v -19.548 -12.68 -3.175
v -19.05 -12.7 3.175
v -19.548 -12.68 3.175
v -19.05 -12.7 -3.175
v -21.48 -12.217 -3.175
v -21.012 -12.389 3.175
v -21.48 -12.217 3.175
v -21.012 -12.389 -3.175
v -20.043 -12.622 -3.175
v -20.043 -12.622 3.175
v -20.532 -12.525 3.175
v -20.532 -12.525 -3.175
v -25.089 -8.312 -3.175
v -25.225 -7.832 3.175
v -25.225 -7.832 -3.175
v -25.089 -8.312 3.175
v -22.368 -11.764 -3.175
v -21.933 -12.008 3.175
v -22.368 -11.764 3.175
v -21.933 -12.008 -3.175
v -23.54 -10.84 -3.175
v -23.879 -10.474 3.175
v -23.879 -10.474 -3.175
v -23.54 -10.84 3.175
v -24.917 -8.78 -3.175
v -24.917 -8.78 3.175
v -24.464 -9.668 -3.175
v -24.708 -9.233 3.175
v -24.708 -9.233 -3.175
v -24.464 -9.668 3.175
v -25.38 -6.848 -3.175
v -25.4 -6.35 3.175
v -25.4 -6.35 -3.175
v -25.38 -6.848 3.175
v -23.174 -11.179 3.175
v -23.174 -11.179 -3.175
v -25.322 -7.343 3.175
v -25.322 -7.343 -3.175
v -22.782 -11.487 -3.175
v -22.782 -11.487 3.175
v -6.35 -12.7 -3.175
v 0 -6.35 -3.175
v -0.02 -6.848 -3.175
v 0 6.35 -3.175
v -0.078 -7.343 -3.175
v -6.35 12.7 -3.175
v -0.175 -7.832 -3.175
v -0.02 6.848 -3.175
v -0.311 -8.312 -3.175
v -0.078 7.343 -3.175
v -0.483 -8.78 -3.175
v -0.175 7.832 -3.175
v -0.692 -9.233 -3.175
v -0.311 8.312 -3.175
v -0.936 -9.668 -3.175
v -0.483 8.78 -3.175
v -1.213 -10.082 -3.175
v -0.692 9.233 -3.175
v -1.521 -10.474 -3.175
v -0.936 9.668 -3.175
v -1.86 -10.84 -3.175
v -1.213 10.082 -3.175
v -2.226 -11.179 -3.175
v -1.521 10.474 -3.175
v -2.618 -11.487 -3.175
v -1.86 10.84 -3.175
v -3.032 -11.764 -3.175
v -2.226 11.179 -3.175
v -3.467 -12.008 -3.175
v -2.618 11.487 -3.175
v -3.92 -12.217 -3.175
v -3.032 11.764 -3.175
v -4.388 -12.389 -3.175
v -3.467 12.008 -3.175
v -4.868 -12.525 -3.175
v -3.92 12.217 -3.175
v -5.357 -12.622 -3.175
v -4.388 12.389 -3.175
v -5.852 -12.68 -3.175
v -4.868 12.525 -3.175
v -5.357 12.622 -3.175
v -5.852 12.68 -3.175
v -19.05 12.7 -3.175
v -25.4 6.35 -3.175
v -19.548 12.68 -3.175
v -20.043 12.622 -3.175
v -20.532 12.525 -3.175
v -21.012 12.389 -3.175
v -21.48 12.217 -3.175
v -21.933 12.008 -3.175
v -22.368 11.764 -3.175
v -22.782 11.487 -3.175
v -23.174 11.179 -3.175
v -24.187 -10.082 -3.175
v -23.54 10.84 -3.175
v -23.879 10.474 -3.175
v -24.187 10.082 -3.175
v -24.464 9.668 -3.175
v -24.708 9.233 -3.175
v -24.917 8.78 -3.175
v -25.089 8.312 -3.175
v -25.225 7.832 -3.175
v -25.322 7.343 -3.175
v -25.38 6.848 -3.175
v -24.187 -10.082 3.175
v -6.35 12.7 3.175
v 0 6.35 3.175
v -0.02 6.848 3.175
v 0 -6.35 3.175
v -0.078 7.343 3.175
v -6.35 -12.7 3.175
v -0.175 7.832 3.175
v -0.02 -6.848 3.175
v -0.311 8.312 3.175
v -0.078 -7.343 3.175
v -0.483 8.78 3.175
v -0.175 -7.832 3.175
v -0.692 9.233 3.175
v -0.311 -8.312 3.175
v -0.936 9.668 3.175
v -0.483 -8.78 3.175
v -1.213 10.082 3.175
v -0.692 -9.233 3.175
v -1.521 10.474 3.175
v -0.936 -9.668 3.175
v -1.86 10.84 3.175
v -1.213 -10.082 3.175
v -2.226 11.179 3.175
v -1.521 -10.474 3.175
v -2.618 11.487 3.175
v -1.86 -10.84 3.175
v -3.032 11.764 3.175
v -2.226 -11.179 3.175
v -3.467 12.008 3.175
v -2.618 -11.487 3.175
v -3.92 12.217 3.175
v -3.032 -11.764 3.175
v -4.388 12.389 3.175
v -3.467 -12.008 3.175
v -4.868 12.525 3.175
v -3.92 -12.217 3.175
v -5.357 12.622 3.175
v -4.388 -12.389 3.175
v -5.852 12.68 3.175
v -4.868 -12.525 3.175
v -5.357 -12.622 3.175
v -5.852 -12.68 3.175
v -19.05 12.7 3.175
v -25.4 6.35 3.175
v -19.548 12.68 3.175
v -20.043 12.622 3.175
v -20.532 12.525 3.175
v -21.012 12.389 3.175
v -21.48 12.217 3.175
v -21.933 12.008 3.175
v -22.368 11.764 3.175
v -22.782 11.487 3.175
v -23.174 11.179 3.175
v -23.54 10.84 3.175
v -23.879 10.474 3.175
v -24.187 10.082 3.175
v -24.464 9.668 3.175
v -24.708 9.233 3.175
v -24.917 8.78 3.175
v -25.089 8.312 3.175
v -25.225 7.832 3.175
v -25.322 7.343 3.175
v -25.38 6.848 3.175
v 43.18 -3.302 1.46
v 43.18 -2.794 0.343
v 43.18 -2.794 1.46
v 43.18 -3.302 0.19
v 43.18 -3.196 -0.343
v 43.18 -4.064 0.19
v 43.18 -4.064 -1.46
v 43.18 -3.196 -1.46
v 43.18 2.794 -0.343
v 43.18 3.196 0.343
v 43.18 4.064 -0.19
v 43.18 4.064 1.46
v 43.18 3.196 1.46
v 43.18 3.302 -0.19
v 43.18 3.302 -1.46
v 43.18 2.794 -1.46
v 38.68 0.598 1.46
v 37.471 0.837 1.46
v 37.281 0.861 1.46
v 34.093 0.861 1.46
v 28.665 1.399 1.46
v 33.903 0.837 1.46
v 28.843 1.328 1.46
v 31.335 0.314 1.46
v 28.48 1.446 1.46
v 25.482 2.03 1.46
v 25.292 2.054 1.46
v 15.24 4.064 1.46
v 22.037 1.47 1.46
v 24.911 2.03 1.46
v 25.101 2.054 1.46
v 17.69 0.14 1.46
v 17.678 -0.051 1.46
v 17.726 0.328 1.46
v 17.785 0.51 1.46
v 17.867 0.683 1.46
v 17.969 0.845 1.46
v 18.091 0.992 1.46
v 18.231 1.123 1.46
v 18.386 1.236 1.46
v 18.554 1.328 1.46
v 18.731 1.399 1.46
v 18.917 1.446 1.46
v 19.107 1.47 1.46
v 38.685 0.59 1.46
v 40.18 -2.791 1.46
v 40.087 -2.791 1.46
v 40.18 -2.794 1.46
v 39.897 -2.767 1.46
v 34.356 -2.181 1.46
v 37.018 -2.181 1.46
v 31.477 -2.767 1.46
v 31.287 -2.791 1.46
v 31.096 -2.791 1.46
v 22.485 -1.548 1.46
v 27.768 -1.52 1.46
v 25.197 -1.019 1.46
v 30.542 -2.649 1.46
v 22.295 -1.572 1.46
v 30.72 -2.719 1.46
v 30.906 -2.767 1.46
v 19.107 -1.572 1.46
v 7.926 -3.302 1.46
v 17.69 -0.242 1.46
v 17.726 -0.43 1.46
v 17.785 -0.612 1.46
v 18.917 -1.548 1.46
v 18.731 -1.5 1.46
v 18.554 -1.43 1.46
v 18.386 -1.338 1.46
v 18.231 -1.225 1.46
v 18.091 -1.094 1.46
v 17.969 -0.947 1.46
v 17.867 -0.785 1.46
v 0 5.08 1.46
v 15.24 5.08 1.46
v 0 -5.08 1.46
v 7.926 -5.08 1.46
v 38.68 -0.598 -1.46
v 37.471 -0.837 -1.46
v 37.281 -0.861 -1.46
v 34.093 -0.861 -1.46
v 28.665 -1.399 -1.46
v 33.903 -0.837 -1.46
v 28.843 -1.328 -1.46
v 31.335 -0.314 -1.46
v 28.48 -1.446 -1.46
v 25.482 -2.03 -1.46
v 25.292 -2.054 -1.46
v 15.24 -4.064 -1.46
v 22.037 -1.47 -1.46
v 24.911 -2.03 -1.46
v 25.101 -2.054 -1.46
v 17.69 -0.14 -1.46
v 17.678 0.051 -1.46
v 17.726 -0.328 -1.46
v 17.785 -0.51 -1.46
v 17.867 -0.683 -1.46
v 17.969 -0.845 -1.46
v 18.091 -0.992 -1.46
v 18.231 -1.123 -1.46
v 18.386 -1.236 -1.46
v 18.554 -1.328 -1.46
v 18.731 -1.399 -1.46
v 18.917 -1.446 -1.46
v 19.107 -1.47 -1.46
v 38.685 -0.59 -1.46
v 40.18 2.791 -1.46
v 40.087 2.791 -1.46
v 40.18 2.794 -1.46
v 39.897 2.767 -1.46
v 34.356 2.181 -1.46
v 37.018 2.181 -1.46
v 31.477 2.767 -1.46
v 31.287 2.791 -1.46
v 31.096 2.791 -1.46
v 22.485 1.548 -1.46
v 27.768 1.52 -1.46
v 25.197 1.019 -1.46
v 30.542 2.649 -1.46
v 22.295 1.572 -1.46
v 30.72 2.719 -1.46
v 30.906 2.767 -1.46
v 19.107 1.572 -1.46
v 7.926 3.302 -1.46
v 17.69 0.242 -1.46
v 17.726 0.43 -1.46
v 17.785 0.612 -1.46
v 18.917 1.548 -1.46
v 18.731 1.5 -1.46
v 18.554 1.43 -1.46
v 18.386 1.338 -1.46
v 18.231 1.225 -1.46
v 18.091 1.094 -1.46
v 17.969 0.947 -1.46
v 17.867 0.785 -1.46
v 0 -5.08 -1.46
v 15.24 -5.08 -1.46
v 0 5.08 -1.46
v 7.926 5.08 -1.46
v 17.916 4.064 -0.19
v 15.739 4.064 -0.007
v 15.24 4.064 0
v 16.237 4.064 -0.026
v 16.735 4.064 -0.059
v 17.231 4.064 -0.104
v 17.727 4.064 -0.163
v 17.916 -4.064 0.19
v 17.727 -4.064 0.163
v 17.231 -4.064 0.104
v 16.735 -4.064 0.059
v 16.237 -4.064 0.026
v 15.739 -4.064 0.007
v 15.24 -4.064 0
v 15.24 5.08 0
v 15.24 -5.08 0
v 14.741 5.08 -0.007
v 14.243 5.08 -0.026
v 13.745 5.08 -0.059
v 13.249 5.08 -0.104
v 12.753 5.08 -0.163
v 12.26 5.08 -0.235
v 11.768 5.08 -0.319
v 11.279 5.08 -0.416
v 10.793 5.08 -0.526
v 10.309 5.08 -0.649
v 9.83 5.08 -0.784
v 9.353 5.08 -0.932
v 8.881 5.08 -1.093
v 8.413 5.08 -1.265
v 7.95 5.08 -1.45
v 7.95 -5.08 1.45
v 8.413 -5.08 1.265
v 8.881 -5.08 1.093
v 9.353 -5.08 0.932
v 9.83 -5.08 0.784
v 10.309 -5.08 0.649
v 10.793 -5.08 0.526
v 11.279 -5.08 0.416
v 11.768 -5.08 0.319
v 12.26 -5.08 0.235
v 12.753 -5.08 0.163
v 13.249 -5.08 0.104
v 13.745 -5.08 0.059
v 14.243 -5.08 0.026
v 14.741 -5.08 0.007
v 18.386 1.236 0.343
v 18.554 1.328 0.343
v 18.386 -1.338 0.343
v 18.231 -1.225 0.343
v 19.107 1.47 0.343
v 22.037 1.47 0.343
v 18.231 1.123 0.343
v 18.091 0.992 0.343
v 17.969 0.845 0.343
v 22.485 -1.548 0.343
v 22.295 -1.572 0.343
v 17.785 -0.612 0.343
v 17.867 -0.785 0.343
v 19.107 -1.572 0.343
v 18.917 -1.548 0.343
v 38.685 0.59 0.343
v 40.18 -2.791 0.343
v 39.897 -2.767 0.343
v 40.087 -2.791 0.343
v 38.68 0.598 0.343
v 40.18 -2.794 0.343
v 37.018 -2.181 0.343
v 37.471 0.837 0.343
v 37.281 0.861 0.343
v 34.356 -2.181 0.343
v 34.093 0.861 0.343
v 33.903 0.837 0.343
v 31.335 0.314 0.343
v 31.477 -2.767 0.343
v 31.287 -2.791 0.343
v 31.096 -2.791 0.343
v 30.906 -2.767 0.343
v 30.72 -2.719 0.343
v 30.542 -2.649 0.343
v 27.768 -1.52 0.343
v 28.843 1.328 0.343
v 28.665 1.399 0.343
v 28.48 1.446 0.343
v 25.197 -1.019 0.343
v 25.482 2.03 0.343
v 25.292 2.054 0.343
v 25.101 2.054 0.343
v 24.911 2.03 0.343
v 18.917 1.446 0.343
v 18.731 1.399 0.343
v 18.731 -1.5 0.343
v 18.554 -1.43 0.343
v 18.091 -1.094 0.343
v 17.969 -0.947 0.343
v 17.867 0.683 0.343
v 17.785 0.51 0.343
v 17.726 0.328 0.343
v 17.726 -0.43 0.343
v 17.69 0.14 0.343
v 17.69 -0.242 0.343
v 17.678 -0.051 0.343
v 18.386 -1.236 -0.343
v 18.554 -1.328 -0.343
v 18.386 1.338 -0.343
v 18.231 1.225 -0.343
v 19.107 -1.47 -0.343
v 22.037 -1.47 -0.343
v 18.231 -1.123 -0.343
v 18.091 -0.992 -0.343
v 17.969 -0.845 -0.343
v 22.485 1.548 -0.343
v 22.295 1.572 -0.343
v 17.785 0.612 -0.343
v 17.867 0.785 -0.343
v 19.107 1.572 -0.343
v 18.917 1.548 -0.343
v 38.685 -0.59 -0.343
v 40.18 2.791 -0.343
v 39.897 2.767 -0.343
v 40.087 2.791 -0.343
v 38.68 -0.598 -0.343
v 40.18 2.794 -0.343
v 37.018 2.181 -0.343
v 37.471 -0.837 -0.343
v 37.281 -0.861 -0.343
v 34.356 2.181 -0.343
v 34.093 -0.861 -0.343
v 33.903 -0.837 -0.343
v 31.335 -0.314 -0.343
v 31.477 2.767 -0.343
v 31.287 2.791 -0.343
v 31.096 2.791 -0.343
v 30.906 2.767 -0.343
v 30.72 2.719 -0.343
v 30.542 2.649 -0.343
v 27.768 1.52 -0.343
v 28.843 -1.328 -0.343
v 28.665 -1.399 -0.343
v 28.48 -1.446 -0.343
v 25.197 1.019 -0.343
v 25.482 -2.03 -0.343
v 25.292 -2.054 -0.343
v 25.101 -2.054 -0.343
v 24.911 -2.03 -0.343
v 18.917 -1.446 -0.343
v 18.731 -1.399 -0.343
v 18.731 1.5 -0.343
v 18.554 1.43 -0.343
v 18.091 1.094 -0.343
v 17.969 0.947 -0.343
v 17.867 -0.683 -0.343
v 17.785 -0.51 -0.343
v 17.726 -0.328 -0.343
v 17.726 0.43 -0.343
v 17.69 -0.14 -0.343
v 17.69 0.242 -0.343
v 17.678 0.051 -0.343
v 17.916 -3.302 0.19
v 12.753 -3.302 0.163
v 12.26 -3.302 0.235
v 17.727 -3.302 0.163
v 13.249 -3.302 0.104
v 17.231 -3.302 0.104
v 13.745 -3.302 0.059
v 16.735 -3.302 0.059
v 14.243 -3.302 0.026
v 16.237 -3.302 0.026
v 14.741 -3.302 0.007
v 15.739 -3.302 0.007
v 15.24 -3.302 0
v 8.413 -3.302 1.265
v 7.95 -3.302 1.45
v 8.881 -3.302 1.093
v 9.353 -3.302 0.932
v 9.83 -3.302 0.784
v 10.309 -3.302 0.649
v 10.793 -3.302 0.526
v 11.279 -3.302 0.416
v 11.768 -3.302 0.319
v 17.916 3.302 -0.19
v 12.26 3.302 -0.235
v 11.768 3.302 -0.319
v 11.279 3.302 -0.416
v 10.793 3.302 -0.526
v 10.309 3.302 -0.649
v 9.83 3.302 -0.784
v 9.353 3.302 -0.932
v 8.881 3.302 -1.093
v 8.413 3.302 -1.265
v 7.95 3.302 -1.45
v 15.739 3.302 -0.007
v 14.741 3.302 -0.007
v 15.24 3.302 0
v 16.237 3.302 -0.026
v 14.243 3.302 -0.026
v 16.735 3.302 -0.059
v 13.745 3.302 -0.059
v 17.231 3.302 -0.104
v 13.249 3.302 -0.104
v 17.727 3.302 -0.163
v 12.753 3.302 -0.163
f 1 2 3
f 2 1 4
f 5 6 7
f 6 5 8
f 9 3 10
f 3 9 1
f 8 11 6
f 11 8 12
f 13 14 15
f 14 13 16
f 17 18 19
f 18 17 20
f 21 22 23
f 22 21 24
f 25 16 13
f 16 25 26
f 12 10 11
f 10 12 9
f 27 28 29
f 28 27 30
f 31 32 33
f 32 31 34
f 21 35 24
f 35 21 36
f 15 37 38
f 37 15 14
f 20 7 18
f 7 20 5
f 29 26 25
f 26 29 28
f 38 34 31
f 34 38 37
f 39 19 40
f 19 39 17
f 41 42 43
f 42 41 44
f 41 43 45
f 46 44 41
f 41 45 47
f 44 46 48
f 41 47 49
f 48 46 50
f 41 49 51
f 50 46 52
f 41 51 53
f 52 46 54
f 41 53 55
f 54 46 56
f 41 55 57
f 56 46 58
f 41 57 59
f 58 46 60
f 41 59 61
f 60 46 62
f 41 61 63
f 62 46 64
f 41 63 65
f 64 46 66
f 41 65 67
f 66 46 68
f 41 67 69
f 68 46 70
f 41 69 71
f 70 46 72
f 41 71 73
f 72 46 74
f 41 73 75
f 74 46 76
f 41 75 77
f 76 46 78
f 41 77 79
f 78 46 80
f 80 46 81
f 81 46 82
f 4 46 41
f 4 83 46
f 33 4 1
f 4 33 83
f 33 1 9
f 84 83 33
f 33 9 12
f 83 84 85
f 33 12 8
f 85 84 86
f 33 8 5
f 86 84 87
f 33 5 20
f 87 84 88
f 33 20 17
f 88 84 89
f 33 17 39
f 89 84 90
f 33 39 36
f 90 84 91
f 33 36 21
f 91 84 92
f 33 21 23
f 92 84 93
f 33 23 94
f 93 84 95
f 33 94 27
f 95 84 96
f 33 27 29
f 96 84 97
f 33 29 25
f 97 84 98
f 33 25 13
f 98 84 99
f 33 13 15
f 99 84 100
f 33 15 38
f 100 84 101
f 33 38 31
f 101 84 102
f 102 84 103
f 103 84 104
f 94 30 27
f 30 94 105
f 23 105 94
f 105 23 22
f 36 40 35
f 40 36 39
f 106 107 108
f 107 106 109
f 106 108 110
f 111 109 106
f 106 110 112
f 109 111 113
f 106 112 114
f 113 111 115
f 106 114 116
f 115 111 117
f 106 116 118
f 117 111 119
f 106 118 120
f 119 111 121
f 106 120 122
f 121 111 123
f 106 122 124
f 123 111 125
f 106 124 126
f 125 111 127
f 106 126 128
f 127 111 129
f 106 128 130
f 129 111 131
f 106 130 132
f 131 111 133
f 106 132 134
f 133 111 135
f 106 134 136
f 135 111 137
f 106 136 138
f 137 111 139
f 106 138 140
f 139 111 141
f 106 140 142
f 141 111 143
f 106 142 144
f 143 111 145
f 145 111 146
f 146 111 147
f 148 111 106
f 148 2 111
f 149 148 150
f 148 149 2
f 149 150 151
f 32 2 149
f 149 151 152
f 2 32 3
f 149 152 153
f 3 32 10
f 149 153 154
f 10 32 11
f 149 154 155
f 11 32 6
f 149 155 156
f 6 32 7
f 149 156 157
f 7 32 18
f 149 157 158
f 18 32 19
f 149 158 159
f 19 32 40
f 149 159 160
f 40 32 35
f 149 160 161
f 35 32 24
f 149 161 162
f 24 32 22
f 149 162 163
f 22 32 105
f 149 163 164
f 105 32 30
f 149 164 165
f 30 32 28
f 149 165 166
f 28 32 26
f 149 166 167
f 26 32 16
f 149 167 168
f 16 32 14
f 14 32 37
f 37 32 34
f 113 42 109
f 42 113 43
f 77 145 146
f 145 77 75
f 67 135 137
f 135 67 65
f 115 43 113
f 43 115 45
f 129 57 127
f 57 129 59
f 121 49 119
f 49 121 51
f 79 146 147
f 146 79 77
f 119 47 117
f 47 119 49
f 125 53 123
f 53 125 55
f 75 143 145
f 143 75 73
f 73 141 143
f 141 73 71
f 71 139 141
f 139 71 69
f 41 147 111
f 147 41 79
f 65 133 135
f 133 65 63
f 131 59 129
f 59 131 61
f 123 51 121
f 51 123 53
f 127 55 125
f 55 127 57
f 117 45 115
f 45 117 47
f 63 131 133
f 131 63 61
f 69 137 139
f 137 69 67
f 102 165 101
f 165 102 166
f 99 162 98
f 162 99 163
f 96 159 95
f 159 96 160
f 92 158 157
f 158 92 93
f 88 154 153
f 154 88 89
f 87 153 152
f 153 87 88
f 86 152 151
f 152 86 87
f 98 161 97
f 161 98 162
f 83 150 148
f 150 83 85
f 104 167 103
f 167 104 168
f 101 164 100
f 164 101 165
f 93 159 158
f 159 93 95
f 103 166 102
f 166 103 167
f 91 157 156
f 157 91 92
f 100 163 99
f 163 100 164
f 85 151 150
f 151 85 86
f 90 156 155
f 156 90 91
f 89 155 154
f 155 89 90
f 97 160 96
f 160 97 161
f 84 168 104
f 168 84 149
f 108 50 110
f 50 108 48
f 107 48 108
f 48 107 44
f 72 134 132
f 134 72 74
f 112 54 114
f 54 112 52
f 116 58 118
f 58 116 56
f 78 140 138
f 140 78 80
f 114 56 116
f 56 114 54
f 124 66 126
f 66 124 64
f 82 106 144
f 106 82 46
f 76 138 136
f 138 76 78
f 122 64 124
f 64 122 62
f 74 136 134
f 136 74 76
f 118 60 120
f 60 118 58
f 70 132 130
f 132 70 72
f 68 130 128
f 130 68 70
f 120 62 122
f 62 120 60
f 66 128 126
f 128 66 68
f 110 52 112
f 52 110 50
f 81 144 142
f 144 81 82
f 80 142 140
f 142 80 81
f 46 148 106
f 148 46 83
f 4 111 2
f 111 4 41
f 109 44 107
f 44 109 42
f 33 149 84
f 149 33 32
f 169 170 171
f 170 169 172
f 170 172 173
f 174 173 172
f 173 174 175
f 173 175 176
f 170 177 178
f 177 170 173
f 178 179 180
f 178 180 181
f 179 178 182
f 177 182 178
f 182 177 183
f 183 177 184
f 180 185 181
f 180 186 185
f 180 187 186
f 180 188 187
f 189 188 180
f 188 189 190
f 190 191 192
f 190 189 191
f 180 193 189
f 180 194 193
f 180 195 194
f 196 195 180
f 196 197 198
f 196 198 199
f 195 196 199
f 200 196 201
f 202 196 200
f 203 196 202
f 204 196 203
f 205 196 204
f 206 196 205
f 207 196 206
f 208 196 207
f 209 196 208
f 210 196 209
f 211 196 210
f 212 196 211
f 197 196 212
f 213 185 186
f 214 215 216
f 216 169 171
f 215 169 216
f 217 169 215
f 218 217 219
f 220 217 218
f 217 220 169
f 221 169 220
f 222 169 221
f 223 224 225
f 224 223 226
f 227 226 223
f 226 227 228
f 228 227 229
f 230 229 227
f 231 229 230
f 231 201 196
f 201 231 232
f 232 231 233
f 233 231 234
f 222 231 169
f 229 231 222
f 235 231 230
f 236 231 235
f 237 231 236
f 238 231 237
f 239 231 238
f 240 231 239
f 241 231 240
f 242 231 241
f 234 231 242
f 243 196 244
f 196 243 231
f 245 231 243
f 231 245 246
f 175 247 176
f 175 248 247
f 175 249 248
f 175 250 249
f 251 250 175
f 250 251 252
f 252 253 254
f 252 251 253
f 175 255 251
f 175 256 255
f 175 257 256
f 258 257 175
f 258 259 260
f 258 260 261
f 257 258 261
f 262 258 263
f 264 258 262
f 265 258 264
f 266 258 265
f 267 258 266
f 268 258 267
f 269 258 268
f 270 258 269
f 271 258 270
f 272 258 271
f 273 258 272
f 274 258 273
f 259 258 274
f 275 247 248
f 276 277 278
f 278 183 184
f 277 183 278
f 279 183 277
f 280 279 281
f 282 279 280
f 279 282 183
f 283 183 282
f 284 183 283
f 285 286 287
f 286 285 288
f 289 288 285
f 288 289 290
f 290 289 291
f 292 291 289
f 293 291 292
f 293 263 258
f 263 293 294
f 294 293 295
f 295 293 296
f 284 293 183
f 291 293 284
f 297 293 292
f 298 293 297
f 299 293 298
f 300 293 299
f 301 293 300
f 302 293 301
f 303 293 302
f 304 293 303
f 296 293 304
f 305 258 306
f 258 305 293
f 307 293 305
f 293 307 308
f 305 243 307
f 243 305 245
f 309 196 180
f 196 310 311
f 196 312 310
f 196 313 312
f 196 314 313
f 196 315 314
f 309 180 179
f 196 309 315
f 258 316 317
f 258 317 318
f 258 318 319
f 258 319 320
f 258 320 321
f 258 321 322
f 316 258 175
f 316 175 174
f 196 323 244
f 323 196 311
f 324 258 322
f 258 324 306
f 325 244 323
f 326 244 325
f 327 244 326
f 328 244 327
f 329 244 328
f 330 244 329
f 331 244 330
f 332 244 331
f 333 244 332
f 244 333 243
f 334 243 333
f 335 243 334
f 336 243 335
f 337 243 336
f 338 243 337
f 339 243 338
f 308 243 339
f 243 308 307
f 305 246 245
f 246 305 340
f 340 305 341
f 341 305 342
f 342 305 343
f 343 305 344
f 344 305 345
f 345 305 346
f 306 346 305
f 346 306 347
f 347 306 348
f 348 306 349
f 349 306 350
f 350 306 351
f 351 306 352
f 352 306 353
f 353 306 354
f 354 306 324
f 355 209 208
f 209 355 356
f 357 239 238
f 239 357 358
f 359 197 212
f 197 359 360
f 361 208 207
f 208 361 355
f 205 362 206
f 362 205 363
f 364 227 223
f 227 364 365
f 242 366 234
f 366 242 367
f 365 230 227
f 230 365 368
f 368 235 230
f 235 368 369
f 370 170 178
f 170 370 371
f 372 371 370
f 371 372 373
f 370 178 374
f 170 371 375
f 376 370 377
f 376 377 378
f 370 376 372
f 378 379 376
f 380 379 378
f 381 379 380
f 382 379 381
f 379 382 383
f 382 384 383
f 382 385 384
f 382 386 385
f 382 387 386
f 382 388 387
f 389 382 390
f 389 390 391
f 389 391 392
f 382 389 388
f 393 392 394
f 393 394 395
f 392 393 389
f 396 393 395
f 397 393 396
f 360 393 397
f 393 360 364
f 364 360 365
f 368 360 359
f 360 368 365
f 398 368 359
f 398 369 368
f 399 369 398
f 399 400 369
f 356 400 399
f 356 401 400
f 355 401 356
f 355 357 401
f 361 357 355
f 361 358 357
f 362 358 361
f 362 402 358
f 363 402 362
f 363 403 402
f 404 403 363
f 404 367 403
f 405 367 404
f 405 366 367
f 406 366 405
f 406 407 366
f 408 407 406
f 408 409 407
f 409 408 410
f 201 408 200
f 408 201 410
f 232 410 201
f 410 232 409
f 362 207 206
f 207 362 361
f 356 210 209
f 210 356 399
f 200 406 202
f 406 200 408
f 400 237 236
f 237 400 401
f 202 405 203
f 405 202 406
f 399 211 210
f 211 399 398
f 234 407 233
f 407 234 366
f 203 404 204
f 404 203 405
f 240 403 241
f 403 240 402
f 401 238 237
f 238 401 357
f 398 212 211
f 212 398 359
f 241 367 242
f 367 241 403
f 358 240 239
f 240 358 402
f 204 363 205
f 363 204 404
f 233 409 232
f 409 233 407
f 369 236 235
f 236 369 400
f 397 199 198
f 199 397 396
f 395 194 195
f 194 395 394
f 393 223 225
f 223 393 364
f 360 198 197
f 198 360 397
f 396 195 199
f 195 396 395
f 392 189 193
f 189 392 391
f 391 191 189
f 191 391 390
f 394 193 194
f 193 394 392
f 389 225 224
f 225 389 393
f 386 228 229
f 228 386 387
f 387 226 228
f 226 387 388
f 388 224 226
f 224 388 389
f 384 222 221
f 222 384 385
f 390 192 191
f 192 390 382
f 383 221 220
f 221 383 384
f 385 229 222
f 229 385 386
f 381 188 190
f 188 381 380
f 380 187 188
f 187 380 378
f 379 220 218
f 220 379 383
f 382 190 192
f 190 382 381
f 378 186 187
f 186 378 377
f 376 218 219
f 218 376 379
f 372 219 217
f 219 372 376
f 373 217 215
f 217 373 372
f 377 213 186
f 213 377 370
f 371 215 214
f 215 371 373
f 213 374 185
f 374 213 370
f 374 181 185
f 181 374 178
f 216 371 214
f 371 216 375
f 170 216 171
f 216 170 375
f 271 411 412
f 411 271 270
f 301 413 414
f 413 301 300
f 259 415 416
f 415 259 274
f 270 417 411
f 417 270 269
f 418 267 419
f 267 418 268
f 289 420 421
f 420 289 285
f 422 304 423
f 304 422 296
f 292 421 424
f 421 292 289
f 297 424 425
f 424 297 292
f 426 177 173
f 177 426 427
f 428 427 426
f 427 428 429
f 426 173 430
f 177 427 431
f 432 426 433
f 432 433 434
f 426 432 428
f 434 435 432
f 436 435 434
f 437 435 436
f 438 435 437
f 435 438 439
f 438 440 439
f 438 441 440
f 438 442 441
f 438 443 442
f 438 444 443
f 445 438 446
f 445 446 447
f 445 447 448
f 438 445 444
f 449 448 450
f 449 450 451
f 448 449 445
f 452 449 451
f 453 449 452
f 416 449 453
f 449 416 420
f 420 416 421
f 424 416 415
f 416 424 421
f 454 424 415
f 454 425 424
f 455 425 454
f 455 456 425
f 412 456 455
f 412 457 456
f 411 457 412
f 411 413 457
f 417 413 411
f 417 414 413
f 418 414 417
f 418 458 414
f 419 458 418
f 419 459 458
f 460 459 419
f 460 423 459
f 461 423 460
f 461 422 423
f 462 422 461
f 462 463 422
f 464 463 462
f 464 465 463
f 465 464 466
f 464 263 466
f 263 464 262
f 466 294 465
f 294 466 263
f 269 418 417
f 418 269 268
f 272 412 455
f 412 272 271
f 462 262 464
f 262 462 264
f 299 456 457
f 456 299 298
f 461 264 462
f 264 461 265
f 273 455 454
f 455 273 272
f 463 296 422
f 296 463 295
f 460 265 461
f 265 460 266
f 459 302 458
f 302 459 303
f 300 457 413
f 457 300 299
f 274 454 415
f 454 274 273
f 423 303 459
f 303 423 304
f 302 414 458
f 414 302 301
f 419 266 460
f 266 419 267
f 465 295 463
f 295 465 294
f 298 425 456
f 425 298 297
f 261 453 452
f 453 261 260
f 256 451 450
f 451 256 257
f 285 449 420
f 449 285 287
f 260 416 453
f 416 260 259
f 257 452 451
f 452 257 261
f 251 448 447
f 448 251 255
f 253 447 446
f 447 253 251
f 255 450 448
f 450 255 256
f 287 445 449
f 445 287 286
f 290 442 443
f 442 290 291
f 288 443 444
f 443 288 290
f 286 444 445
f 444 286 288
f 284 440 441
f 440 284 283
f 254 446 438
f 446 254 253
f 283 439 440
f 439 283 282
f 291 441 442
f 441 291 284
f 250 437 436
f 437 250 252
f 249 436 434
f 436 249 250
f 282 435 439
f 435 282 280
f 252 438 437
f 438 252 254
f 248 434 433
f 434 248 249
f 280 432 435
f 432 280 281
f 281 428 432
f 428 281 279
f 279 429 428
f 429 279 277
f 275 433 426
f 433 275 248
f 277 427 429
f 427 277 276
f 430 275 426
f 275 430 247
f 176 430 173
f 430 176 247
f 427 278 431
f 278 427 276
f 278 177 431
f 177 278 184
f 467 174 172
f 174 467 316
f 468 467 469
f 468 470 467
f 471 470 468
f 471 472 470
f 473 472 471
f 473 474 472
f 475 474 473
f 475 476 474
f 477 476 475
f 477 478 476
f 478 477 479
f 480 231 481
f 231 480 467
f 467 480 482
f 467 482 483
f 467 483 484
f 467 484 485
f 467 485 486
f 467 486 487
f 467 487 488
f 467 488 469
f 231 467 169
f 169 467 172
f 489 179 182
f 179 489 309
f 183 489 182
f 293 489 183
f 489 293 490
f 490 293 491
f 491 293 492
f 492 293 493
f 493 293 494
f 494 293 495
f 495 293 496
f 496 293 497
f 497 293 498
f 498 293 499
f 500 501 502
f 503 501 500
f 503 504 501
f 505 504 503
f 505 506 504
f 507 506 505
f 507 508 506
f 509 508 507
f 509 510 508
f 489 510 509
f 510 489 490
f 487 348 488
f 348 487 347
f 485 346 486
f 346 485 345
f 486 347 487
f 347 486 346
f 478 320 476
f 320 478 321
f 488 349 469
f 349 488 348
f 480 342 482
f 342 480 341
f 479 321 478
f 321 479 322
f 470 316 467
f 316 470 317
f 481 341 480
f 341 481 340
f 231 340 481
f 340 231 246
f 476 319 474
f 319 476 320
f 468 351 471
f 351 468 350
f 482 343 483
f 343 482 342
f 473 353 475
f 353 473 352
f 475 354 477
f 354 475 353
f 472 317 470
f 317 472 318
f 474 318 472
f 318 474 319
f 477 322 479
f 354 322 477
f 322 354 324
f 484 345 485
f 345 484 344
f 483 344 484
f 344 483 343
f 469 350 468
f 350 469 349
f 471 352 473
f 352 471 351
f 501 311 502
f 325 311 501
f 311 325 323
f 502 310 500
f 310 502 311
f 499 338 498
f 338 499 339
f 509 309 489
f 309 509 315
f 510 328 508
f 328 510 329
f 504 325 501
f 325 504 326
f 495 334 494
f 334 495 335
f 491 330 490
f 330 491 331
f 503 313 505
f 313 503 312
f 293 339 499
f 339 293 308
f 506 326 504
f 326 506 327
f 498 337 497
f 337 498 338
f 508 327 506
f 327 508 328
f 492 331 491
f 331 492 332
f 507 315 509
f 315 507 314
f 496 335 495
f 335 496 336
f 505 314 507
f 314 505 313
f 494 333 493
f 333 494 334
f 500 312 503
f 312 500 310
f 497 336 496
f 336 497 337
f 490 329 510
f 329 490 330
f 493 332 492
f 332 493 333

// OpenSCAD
///////////////////
///  PARAMETERS ///
///////////////////


key_code = [3,3,4,3,1,2,2,1]; // this is the key code


///////////////////////////////////////////////////////////


MM_PER_IN = 25.4;

$fa=0.5; // default minimum facet angle is now 0.5
$fs=0.5; // default minimum facet size is now 0.5 mm

// All units in inches then converted to mm

// Key Head
key_head_width                = 1       * MM_PER_IN;
key_head_length               = 1       * MM_PER_IN;
key_head_height               = 0.25    * MM_PER_IN;
key_head_radius               = 0.25    * MM_PER_IN;

// Key Blade
blade_height                  = 0.115   * MM_PER_IN;
blade_width                   = 0.320   * MM_PER_IN;
blade_length                  = 1.70    * MM_PER_IN;

// Guide Groove in Side of Key Blade
side_groove_offset_from_head  = 1.1     * MM_PER_IN;
side_groove_depth             = 0.05    * MM_PER_IN;
side_groove_width             = 0.03    * MM_PER_IN;
side_groove_taper_radius      = 0.75    * MM_PER_IN;

// Key Stop - wider area at top of key blade
key_stop_offset               = 0.04    * MM_PER_IN;
key_stop_height               = 0.250   * MM_PER_IN;

// Cuts
cut_depth                     = 0.044   * MM_PER_IN; // depth of cut
cut_r                         = 0.120/2 * MM_PER_IN; // radius of cutter
cut_spacing                   = 0.118   * MM_PER_IN; // spacing between cuts
cut_positions                 = [ 0.150 * MM_PER_IN, // 1
                                  0.126 * MM_PER_IN, // 2
                                  0.102 * MM_PER_IN, // 3
                                  0.079 * MM_PER_IN  // 4 
                                ]; // these are the cuts according to the key data sheet
cut_insets                    = [ cut_spacing * 8,
                                  cut_spacing * 7,
                                  cut_spacing * 6,
                                  cut_spacing * 5,
                                  cut_spacing * 4,
                                  cut_spacing * 3,
                                  cut_spacing * 2,
                                  cut_spacing * 1
                                ] ;



//////////////////////////
///  FUNCTIONS/MODULES ///
//////////////////////////


module rounded_cir(w,l,h,r){
  // Creates a cube with the x-y edges rounded
  // Parameters:
  // w - width of cube
  // l - length of cube
  // h - height of cube
  // r - radius of rounded edges
  translate([-w/2,0,0])
  union()
  {
    translate([(-w/2+r), (-l/2+r), 0]) cylinder(r=r,h=h, center=true);
    translate([(w/2-r), (-l/2+r), 0])  cylinder(r=r,h=h, center=true);
    translate([(-w/2+r), (l/2-r), 0])  cylinder(r=r,h=h, center=true);
    translate([(w/2-r), (l/2-r), 0])   cylinder(r=r,h=h, center=true);
    cube([w-2*r,l,h], center=true); // space left inside
    cube([w,l-2*r,h], center=true); // and in the other way
  }
}

module key_cuts(rotation){
  // Creates cuts in key blade - made to be subtracted
  // parameters - rotation coordinates
  rotate(rotation)
    union(){

      // Make all blade cuts
      for(i=[0:1:6]){
        hull(){
          c1_code = key_code[i];
          c1_pos = cut_insets[i];
          c1_depth = cut_positions[c1_code-1];

          c2_code = key_code[i+1];
          c2_pos = cut_insets[i+1];
          c2_depth = cut_positions[c2_code-1];

          translate([blade_length-c1_pos,+blade_width/2-cut_r-c1_depth, blade_height/2-cut_depth]) cylinder(r=cut_r,h=blade_height, $fn=50);
          translate([blade_length-c2_pos,+blade_width/2-cut_r-c2_depth, blade_height/2-cut_depth]) cylinder(r=cut_r,h=blade_height, $fn=50);
        }    
      }
        // Cut entry way in blade
        translate([blade_length-3,-2,blade_height/2-cut_depth]) rotate([0,0,30]) cube([10,3,10]);
        translate([blade_length-3,-cut_r*2+blade_width/2-cut_positions[0],blade_height/2-cut_depth]) rotate([0,0,0]) cube([10,cut_r*2,10]);
  }
}


///////////////////////
///  MODEL CREATION ///
///////////////////////


// Create hey head
rounded_cir(  w=key_head_width, 
              l=key_head_length, 
              h=key_head_height, 
              r=key_head_radius );


// Key Blade
side_groove_offset = blade_length-side_groove_offset_from_head; // where to start cube cut - distance from key head
difference(){
  union(){
    // create key blade base
    translate([0,-blade_width/2,-blade_height/2]) 
      cube([blade_length,blade_width,blade_height]);
    // create key stop
    translate([0,-blade_width/2-key_stop_offset,-blade_height/2]) 
      cube([side_groove_offset,blade_width+key_stop_offset*2,blade_height]);
  }
  // cut side grove guide slots - one cut for each side
  translate([side_groove_offset,-blade_width*1.5+side_groove_width,blade_height/2-side_groove_depth]) 
    cube([blade_length,blade_width,blade_height]); // make cube same size as blade to use for cutting
  translate([side_groove_offset,blade_width/2-side_groove_width,-blade_height*1.5+side_groove_depth]) 
    cube([blade_length,blade_width,blade_height]); // make cube same size as blade to use for cutting

  // cut side groove taper on each side
  translate([side_groove_offset,-blade_width/2+side_groove_width,side_groove_taper_radius]) rotate([90,0,0])  cylinder(r=side_groove_taper_radius,h=side_groove_width*4);
  translate([side_groove_offset,side_groove_width*4+blade_width/2-side_groove_width,-side_groove_taper_radius]) rotate([90,0,0])  cylinder(r=side_groove_taper_radius,h=side_groove_width*4);
  // make cuts in blade
  key_cuts([0,0,0]);
  key_cuts([180,0,0]);
  }
